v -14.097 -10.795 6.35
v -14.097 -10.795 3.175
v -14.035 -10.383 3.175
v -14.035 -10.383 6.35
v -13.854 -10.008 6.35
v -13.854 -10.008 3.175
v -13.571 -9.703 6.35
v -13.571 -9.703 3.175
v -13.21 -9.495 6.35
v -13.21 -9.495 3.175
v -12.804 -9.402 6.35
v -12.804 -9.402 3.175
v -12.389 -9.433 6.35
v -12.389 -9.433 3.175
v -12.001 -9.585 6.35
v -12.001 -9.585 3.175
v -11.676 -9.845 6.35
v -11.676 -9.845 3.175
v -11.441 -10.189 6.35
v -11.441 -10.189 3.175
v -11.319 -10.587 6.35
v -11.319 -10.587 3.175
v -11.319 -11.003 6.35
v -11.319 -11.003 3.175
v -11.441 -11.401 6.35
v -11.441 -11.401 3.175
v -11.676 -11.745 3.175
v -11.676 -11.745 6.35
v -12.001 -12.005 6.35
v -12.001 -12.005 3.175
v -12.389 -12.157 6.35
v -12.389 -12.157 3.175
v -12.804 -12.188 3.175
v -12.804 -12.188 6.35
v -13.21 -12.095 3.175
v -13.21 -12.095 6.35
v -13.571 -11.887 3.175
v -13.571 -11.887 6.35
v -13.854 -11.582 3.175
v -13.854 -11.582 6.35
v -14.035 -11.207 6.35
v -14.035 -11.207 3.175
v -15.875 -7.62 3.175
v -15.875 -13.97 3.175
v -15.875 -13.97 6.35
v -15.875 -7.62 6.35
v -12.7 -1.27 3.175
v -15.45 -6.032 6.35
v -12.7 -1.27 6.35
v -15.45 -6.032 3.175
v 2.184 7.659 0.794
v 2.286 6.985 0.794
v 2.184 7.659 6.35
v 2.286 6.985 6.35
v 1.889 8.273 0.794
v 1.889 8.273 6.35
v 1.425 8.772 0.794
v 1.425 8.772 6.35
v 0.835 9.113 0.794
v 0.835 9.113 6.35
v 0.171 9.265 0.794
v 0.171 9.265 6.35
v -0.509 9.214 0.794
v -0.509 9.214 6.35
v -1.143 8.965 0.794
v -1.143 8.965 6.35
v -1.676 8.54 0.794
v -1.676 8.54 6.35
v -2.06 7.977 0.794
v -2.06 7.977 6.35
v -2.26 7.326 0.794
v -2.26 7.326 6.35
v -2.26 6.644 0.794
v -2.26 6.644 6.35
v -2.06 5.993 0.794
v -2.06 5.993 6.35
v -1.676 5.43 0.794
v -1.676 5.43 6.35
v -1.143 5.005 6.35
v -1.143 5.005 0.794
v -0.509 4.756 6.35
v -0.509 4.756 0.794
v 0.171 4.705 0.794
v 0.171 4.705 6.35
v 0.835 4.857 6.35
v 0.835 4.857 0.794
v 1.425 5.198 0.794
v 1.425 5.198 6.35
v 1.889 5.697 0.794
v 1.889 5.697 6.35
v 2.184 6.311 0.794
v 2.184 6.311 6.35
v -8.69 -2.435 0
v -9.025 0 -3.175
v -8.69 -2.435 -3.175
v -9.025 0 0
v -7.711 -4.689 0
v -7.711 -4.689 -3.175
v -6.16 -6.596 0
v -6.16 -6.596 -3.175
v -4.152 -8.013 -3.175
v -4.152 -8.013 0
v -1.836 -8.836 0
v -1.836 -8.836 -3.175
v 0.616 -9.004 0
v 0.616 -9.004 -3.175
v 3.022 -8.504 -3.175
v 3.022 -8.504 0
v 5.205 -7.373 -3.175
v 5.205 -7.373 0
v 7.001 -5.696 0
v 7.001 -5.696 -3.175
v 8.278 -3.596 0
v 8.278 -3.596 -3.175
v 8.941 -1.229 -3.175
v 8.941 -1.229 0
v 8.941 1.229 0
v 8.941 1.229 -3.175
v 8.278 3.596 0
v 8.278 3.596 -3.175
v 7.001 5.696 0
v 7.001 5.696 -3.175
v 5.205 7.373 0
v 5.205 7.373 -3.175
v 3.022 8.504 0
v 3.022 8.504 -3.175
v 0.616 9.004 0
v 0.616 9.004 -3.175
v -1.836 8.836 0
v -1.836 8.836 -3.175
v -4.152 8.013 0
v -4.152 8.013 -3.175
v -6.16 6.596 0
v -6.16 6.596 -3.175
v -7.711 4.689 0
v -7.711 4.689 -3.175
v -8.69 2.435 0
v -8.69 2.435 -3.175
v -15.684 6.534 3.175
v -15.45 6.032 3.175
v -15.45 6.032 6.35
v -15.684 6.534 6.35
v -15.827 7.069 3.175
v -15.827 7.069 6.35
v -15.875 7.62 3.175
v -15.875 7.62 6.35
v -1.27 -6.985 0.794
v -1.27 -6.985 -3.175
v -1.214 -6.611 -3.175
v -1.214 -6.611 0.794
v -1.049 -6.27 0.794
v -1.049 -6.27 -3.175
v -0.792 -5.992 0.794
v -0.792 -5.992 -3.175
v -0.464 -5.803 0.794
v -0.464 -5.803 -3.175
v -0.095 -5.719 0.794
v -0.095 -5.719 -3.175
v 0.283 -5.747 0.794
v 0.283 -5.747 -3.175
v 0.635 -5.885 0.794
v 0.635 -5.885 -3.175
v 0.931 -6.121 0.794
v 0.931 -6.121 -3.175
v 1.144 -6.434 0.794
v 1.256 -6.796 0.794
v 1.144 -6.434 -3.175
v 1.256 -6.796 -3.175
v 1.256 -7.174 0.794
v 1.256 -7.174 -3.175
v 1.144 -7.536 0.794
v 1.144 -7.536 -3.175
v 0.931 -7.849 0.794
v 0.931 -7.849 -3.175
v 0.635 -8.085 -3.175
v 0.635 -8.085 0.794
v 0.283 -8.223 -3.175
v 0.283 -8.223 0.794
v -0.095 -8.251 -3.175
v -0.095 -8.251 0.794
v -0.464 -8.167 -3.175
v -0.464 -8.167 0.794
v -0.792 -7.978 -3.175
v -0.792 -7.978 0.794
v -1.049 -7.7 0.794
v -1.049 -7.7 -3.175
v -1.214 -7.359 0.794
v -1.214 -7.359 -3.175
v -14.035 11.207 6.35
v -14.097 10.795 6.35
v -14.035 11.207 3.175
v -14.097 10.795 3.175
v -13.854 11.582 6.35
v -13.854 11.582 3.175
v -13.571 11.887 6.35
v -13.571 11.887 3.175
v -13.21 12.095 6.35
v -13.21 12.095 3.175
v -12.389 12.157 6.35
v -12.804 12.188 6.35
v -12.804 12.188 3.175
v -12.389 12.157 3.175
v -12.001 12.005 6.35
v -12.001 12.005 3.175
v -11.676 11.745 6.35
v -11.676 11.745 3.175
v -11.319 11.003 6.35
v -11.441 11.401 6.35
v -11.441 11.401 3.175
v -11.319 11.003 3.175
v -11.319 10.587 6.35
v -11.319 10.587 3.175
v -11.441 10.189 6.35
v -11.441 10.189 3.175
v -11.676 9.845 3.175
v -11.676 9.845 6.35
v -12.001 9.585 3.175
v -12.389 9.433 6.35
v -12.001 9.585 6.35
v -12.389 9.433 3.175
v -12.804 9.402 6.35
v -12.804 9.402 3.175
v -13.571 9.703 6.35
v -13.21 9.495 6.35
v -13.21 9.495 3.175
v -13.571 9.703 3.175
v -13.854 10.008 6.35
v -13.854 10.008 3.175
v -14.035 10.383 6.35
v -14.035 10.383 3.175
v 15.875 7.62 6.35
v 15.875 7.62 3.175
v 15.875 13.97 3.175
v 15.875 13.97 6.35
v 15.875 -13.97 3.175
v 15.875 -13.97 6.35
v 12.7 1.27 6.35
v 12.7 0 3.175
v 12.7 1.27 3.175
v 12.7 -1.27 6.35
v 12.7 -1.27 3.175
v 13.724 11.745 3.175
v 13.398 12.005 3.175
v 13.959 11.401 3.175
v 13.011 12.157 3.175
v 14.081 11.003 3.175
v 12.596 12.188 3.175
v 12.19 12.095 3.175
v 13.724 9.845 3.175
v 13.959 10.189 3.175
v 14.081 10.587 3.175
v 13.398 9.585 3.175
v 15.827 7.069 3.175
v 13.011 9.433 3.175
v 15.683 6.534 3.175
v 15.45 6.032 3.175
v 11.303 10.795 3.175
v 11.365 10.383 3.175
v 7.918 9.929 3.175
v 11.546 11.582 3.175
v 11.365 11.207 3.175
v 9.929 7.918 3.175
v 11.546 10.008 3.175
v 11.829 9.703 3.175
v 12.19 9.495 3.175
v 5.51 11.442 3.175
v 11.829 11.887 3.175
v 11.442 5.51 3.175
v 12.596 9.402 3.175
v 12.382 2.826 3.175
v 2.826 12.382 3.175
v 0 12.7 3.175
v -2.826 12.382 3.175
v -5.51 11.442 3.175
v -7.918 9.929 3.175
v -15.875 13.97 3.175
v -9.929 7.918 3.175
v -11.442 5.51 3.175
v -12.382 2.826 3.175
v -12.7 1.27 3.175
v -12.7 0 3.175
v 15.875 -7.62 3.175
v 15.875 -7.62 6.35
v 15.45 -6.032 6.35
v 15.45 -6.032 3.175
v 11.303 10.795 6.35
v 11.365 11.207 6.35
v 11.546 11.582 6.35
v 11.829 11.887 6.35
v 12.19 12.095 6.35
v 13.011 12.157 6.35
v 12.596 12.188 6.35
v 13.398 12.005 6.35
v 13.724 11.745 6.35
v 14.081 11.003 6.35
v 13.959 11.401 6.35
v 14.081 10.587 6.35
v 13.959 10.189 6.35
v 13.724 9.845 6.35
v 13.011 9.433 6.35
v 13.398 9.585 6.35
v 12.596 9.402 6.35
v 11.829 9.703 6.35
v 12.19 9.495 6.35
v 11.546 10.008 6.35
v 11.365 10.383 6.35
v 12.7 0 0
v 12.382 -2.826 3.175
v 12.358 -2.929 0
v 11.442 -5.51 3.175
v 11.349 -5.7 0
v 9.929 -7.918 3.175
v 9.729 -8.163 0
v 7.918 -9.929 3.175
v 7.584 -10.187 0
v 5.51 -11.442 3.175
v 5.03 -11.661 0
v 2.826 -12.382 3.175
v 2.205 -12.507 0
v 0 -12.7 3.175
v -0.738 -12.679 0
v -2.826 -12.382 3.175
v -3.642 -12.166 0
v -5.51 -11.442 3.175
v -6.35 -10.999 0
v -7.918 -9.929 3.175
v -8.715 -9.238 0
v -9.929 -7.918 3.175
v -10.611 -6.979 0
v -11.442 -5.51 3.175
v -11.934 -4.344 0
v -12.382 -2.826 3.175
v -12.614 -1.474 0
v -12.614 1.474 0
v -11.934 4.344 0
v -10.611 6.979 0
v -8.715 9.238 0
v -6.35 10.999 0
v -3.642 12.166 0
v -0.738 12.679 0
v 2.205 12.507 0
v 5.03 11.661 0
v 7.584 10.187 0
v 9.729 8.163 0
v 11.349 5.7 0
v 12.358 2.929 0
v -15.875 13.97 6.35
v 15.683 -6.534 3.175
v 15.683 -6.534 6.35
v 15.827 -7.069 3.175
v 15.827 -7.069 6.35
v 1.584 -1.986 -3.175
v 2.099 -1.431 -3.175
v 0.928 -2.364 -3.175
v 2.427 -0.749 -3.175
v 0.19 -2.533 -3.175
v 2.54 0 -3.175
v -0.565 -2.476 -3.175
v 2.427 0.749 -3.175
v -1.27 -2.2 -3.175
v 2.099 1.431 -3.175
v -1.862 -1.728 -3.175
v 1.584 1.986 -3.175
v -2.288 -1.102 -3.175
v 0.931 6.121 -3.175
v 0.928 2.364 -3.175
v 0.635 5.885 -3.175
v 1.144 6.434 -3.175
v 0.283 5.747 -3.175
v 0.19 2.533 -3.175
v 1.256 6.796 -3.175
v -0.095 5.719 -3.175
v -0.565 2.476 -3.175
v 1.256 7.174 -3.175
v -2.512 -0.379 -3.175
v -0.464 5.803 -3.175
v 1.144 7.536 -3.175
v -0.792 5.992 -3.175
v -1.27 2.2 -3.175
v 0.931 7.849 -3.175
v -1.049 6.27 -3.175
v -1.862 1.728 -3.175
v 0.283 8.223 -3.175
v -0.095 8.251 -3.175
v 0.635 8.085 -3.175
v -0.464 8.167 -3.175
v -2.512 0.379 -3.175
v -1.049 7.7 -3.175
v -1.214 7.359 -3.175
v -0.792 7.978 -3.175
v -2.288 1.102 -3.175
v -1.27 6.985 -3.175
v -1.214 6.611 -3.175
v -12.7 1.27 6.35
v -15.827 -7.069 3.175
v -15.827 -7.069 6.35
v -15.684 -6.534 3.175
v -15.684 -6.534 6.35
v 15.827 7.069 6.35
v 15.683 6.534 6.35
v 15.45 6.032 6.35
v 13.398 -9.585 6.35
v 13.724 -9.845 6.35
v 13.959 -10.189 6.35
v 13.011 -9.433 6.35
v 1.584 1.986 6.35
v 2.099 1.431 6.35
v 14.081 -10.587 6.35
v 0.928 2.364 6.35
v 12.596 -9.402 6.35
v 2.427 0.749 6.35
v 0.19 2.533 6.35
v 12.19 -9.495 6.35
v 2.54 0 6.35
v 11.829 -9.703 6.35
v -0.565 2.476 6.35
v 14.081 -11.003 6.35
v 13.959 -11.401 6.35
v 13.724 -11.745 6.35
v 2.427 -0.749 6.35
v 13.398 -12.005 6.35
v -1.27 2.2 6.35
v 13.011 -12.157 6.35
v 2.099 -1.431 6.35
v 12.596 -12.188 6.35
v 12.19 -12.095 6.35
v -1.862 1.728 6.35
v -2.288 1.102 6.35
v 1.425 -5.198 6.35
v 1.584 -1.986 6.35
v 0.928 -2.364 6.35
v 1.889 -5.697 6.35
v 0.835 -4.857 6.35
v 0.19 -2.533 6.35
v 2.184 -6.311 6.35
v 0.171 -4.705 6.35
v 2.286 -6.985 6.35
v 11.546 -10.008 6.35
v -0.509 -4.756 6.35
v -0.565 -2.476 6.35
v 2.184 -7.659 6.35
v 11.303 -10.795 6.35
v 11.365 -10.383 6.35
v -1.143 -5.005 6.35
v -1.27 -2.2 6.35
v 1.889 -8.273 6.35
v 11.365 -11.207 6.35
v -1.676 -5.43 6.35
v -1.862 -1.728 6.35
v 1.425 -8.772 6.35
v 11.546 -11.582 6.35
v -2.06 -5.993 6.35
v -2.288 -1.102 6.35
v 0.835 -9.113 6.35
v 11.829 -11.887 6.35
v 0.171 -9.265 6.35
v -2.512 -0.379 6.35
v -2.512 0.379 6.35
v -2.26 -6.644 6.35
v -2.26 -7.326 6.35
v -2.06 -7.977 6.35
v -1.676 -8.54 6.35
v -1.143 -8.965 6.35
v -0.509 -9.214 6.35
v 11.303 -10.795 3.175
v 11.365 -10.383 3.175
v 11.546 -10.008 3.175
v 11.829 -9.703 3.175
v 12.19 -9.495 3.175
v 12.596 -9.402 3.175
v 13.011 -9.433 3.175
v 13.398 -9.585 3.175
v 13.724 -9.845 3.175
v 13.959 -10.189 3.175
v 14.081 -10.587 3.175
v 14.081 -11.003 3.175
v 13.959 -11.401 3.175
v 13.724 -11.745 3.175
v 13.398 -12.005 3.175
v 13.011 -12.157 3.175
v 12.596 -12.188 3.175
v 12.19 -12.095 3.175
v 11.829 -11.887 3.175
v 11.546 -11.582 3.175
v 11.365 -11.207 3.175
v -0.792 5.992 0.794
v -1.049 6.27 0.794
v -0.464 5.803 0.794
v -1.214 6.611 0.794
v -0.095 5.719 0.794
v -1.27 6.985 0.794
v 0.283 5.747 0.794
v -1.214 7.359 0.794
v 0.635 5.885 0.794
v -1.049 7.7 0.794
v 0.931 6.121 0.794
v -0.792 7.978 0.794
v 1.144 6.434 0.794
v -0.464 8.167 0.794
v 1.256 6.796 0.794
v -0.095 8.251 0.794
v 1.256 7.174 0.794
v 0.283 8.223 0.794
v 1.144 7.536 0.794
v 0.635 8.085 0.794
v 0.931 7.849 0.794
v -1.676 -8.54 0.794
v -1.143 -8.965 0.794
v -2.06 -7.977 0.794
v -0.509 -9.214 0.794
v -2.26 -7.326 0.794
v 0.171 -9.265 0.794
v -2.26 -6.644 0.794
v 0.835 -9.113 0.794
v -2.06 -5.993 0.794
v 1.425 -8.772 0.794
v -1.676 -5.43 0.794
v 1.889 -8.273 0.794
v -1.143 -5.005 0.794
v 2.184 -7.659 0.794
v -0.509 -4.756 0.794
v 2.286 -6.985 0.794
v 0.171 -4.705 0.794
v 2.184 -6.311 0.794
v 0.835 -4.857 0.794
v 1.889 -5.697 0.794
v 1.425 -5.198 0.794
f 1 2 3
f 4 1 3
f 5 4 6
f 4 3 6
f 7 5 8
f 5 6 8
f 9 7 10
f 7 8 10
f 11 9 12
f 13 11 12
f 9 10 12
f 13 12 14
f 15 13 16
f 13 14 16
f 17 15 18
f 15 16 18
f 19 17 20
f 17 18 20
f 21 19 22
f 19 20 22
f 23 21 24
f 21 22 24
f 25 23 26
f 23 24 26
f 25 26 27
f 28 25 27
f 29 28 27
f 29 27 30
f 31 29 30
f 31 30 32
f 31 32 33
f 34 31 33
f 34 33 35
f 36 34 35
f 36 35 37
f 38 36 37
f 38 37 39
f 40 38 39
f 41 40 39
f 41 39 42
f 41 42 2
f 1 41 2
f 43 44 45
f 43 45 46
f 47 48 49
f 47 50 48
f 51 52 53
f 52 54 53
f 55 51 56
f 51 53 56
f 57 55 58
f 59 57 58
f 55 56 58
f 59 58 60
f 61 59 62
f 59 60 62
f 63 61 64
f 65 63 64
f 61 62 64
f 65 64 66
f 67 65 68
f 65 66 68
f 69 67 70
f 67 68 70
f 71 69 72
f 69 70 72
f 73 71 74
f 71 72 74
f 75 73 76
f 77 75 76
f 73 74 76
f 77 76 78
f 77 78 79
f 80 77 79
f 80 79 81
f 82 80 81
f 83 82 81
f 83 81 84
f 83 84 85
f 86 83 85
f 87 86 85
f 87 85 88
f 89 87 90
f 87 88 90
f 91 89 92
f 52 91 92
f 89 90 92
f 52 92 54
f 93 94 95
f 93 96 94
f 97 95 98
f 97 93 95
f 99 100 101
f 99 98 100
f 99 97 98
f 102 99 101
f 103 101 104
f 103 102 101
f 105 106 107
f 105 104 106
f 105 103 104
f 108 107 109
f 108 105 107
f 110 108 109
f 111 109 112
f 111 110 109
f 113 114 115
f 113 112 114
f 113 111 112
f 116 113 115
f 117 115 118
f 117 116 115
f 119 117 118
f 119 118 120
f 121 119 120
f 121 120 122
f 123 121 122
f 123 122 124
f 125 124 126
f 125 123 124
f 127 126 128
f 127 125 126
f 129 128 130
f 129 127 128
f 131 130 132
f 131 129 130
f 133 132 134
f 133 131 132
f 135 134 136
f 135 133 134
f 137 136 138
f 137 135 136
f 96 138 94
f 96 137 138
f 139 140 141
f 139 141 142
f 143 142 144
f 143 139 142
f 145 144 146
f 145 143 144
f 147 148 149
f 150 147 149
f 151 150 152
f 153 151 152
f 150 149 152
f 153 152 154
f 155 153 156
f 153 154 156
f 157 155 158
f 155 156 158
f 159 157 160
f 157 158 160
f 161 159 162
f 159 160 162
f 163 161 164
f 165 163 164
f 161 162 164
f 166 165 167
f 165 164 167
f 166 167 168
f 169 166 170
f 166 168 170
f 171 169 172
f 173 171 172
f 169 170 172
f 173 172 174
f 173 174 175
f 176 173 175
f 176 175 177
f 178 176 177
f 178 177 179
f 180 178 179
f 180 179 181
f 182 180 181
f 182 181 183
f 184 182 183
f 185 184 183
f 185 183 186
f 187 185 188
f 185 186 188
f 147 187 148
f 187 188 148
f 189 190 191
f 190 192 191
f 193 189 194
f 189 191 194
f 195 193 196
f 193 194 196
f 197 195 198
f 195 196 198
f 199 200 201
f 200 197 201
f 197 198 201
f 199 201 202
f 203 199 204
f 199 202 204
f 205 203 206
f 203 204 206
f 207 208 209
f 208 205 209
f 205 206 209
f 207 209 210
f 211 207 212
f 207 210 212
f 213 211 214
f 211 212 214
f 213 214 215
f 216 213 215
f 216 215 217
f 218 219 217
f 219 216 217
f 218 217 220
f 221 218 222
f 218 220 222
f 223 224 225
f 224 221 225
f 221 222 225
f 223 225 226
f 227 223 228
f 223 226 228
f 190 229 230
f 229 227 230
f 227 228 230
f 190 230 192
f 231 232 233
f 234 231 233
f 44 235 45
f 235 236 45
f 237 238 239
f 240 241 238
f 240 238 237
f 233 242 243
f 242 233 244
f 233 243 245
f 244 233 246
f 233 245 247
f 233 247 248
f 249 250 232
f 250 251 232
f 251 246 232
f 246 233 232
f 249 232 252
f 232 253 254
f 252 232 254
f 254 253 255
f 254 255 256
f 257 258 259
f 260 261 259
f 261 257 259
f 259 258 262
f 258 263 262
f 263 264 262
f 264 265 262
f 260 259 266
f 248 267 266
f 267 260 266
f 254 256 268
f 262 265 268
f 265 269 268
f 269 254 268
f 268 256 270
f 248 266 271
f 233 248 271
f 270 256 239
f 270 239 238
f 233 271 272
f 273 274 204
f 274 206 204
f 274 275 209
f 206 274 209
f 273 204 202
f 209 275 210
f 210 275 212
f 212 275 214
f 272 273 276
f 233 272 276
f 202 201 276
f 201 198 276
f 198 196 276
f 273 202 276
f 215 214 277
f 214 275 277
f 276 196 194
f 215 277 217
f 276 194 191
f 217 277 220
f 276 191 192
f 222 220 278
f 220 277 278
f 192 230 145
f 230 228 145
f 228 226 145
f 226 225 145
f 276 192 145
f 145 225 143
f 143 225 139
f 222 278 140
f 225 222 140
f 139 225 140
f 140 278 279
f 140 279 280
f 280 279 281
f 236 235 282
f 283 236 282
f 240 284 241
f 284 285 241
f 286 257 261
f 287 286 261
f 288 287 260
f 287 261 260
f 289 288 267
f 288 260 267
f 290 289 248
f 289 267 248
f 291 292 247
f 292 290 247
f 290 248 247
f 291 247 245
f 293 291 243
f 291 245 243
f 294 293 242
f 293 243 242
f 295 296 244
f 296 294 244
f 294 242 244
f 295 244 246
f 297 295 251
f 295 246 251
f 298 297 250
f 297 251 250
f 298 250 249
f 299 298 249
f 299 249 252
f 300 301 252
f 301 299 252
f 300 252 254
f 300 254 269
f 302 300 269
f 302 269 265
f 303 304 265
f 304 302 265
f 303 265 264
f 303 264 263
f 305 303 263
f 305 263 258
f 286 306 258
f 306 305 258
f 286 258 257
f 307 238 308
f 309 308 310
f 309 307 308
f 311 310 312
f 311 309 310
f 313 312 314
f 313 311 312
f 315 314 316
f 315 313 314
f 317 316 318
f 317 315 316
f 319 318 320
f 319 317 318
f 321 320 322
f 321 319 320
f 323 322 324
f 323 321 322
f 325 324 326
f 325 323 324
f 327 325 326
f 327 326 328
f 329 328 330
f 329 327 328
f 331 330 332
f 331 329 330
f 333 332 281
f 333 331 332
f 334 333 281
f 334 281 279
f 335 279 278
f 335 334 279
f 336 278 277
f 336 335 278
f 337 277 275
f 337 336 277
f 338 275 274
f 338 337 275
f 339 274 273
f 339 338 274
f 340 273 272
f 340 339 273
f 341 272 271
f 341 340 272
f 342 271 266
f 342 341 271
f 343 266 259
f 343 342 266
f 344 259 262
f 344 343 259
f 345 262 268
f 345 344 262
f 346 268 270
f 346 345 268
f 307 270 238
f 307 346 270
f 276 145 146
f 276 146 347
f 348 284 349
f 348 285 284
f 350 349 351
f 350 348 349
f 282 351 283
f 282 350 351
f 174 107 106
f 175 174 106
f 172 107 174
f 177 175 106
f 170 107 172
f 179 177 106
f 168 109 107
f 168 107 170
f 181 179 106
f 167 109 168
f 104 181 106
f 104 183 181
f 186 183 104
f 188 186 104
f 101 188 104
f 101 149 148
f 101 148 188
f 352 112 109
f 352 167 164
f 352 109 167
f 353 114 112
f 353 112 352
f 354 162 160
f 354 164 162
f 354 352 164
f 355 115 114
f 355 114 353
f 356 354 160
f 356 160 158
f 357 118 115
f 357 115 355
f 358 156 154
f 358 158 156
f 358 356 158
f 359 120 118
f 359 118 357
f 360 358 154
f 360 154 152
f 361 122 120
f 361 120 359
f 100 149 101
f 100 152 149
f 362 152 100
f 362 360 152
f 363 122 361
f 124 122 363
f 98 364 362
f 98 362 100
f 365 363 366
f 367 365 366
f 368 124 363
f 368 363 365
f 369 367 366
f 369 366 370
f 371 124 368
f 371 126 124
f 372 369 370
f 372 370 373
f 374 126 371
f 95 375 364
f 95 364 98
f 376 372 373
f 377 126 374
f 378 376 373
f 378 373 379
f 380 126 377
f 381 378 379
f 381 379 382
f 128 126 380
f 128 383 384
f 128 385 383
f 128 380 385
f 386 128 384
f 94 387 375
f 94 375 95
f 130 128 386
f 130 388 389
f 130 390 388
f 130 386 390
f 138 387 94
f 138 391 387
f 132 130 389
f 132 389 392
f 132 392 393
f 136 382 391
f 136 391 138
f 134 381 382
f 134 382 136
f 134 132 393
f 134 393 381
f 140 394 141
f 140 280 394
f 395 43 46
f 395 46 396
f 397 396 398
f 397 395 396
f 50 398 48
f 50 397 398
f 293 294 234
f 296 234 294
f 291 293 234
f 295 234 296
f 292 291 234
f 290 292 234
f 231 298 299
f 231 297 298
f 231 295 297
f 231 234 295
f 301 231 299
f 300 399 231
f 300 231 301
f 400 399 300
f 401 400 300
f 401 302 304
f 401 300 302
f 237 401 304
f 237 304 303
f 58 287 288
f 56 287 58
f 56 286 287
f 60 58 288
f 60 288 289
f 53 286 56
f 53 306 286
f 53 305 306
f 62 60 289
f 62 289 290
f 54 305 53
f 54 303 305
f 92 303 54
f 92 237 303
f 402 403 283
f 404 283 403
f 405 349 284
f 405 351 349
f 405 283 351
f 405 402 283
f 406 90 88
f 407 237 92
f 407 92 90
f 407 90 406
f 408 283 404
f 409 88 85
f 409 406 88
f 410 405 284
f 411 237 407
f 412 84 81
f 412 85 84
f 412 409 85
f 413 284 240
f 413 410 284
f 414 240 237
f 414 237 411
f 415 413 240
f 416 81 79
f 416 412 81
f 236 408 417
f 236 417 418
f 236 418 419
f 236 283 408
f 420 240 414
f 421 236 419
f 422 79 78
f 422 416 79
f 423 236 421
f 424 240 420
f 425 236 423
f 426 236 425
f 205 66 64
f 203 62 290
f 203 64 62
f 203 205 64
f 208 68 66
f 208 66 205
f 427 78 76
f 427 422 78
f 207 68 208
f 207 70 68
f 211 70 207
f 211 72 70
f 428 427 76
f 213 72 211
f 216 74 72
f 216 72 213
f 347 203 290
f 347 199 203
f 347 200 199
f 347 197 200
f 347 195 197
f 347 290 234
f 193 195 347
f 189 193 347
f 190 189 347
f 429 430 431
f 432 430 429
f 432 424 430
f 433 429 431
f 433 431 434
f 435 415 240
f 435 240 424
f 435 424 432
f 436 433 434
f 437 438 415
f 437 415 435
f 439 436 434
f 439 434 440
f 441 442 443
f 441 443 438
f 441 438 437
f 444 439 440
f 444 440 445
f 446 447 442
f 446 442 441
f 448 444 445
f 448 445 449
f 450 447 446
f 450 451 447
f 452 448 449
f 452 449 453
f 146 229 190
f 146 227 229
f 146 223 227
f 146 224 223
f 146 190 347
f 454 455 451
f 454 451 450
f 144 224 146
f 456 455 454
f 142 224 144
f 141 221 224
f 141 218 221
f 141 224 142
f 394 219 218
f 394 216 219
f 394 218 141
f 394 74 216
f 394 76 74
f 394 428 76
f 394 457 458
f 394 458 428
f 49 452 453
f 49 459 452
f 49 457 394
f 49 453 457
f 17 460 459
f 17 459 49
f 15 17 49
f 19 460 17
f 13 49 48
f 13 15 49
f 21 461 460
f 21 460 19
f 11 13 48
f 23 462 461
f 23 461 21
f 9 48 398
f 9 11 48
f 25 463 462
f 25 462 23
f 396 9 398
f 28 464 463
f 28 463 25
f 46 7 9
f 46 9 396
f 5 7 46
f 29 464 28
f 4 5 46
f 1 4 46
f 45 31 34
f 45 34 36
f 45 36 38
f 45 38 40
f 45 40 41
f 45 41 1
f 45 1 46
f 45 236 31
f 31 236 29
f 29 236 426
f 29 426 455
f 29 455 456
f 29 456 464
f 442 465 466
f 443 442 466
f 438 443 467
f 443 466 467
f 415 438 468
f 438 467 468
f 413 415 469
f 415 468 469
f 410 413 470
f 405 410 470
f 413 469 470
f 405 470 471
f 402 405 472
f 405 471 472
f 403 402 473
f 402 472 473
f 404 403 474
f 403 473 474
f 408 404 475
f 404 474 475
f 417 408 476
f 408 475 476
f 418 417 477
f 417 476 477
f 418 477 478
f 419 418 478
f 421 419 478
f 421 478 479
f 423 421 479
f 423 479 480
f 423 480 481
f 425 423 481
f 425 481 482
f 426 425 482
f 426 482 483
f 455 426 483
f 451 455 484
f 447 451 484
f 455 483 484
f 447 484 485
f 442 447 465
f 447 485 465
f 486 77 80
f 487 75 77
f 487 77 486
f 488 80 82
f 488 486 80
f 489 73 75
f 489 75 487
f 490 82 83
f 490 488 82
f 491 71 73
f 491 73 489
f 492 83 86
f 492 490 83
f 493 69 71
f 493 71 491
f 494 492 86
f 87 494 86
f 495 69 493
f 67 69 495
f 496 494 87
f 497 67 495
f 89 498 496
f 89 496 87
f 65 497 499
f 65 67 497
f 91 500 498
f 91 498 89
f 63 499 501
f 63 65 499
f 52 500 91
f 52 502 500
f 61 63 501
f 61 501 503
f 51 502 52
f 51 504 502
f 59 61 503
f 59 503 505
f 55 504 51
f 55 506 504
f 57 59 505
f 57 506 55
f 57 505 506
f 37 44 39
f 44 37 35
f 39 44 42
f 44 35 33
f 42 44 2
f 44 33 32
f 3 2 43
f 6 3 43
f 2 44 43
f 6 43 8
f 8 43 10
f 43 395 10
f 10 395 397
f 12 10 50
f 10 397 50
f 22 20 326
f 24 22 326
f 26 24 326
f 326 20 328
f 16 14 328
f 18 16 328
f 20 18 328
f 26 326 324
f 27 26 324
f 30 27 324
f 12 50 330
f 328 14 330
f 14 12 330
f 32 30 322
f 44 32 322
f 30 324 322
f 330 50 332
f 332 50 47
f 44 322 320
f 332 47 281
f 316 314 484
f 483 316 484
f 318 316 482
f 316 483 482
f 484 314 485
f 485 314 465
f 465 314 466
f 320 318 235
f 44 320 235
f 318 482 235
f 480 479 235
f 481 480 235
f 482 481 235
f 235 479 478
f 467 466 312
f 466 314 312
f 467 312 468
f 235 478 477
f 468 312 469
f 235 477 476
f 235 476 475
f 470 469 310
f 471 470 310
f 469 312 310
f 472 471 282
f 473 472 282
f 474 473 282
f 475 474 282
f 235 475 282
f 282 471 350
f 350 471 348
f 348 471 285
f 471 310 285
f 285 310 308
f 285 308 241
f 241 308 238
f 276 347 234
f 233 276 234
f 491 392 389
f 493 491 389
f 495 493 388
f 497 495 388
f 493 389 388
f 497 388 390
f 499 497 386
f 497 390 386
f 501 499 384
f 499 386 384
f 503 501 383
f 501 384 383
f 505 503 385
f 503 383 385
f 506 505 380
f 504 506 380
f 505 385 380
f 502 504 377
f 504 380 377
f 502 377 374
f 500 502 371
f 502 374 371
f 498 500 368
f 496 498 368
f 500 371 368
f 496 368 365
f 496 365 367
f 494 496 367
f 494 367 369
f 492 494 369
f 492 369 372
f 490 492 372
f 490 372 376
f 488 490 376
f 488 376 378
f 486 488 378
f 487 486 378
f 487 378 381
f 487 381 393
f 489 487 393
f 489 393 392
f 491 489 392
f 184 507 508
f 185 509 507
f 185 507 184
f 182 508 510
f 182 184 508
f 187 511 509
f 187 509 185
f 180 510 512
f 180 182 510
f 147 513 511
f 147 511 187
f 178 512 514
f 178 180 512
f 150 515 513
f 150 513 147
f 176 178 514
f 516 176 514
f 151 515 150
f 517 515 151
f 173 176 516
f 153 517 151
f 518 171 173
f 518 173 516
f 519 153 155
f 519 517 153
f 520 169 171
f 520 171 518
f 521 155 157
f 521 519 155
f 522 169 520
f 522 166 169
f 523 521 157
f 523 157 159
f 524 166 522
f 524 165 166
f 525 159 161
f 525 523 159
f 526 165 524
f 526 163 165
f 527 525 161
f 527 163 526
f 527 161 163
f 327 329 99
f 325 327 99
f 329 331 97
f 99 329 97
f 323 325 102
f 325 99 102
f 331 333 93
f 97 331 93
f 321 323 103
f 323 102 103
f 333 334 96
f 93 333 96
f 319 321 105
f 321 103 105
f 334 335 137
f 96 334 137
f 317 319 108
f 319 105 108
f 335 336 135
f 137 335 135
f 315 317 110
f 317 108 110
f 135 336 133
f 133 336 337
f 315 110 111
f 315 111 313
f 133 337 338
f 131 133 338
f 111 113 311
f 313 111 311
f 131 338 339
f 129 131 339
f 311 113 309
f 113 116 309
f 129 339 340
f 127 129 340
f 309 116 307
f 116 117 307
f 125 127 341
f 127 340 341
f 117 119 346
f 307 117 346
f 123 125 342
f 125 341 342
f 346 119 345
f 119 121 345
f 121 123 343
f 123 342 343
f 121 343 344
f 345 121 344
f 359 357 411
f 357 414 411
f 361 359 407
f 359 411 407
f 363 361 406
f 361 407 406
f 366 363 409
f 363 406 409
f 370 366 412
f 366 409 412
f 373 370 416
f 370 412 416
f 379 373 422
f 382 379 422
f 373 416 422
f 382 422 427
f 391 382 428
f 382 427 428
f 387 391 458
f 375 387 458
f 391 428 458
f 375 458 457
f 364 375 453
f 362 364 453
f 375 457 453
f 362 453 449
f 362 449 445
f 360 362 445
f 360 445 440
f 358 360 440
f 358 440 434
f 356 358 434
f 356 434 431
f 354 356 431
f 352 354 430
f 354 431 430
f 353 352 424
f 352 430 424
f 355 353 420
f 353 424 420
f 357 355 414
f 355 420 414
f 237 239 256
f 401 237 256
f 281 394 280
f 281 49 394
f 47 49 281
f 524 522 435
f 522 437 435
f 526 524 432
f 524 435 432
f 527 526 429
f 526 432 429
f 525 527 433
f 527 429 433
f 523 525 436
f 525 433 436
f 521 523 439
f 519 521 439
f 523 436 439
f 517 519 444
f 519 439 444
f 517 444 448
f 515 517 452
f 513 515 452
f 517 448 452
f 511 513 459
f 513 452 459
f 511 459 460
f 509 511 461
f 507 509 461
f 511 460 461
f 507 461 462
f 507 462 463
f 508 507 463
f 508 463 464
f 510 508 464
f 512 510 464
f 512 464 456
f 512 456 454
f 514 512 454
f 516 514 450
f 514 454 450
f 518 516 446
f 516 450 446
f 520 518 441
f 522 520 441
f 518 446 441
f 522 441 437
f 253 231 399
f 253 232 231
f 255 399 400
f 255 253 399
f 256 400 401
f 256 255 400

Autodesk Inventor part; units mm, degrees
ref_plane "YZ Plane" through (0, 0, 0) normal (1, 0, 0) x (0, 1, 0)
ref_plane "Work Plane1" through (0, 0, 0) normal (0, 0, 1) x (1, 0, 0)
sketch "Sketch1" plane through (0, 0, 0) normal (0, 0, 1) x (1, 0, 0)
  circle A0 centre (0, 0) radius 9.525 projected
  circle A1 centre (0, 0) radius 12.7 projected
  point P0 (0, 0)
extrude "Extrusion1" add sketch "Sketch1" along normal blind 3.175 contours A0 | A1
sketch "Sketch2" plane through (0, 0, 0) normal (0, 0, -1) x (-1, 0, 0)
  circle A0 centre (0, 0) radius 9.025
  point P0 (0, 0)
  dimension "d2" = 18.05
extrude "Extrusion2" add sketch "Sketch2" along normal blind 3.175
sketch "Sketch3" plane through (0, 0, 3.175) normal (0, 0, 1) x (1, 0, 0)
  circle A0 centre (0, 0) radius 2.54
  point P0 (0, 0)
  dimension "d5" = 5.08
extrude "Extrusion3" cut sketch "Sketch3" against normal through all
sketch "Sketch4" plane through (0, 0, 0) normal (0, 1, 0) x (-1, 0, 0)
  line L0 (12.7, 3.175) -> (-12.7, 3.175) projected
  line L1 (-12.7, 3.175) -> (12.7, 3.175)
  line L2 (12.7, 3.175) -> (12.7, 6.35)
  line L3 (12.7, 6.35) -> (-12.7, 6.35)
  line L4 (-12.7, 6.35) -> (-12.7, 3.175)
  point P0 (0, 0)
  dimension "d8" = 3.175
ref_plane "Work Plane2" through (-27.0849, -13.97, -71.335) normal (0, 1, 0) x (0, 0, 1)
extrude "Extrusion4" add sketch "Sketch4" against normal up to surface (13.97 mm away)
sketch "Sketch5" plane through (0, 0, 3.175) normal (0, 0, 1) x (1, 0, 0)
  line L0 (-12.7, 0) -> (-2.54, 0) projected
  arc A0 (2.54, 0) -> (-2.54, 0) centre (0, 0) ccw projected
  line L1 (2.54, 0) -> (12.7, 0) projected
  arc A1 (12.7, 0) -> (-12.7, 0) centre (0, 0) ccw projected
  point P0 (0, 0)
extrude "Extrusion5" add sketch "Sketch5" along normal blind 3.175
sketch "Sketch6" plane through (0, 0, 6.35) normal (0, 0, 1) x (1, 0, 0)
  circle A0 centre (0, 0) radius 1.905
  point P0 (0, 0)
extrude "Extrusion6" cut sketch "Sketch6" against normal blind 3.175
sketch "Sketch8" plane through (0, 0, 3.175) normal (0, 0, -1) x (-1, 0, 0)
  line L0 (-29.0812, -13.97) -> (27.0849, -13.97) projected
  arc A0 (-1.905, 0) -> (1.905, 0) centre (0, 0) ccw projected
  arc A1 (12.7, 0) -> (-12.7, 0) centre (0, 0) ccw projected
  line L1 (12.7, 0) -> (12.7, -13.97) projected
  line L2 (-12.7, -13.97) -> (12.7, -13.97) projected
  line L3 (-12.7, 0) -> (-12.7, -13.97) projected
  line L4 (15.875, -13.97) -> (15.875, -7.62)
  line L5 (15.4496, -6.0325) -> (12.7, -1.27)
  line L6 (12.7, 0) -> (12.7, -13.97) projected
  arc A2 (15.875, -7.62) -> (15.4496, -6.0325) centre (12.7, -7.62) ccw
  line L7 (-15.875, -13.97) -> (-15.875, -7.62)
  line L8 (-15.4496, -6.0325) -> (-12.7, -1.27)
  line L9 (-12.7, 0) -> (-12.7, -13.97) projected
  arc A3 (-15.4496, -6.0325) -> (-15.875, -7.62) centre (-12.7, -7.62) ccw
  line L10 (2.54, 0) -> (1.905, 0) projected
  arc A4 (2.54, 0) -> (-2.54, 0) centre (0, 0) ccw projected
  line L11 (-1.905, 0) -> (-2.54, 0) projected
  point P0 (0, 0)
  dimension "d21" = 3.175
  dimension "d22" = 3.175
  dimension "d23" = 6.35
  dimension "d24" = 3.175
  dimension "d25" = 3.175
  dimension "d26" = 6.35
extrude "Extrusion8" add sketch "Sketch8" against normal blind 3.175 contours L7 A3 L8 L3 L0 | L1 L5 A2 L4 L0
sketch "Sketch9" plane through (0, 0, 3.175) normal (0, 0, -1) x (-1, 0, 0)
  circle A0 centre (12.7, -10.795) radius 1.397
  circle A1 centre (-12.7, -10.795) radius 1.397
  line L0 (15.875, -13.97) -> (15.875, -7.62) projected
  line L1 (-15.875, -13.97) -> (15.875, -13.97) projected
  line L2 (-15.875, -7.62) -> (-15.875, -13.97) projected
  point P0 (0, 0)
  dimension "d29" = 3.175
  dimension "d30" = 3.175
  dimension "d31" = 2.794
  dimension "d32" = 3.175
  dimension "d33" = 3.175
extrude "Extrusion9" cut sketch "Sketch9" against normal blind 3.175
sketch "Sketch10" plane through (0, 0, 6.35) normal (0, 0, 1) x (1, 0, 0)
  circle A0 centre (0, 0) radius 2.54
  circle A1 centre (0, 6.985) radius 2.286
  circle A2 centre (0, -6.985) radius 2.286
  circle A3 centre (0, 0) radius 9.025 projected
  dimension "d36" = 5.08
  dimension "d37" = 4.572
  dimension "d38" = 4.572
  dimension "d39" = 6.985
  dimension "d40" = 6.985
extrude "Extrusion10" cut sketch "Sketch10" against normal through all contours A0
extrude "Extrusion11" cut sketch "Sketch10" against normal blind 5.5563 contours A1 A3 | A3 A1 | A3 A2 | A2 A3
sketch "Sketch11" plane through (0, 0, -3.175) normal (0, 0, -1) x (-1, 0, 0)
  circle A0 centre (0, -6.985) radius 2.286 projected
  circle A1 centre (0, 6.985) radius 2.286 projected
  circle A2 centre (0, -6.985) radius 1.27
  circle A3 centre (0, 6.985) radius 1.27
  point P0 (0, 0)
  dimension "d45" = 2.54
extrude "Extrusion12" cut sketch "Sketch11" against normal through all contours A2 | A3
mirror "Mirror1" about plane through (0, 0, 0) normal (0, 1, 0) of "Extrusion8", "Extrusion9", "Extrusion4", "Extrusion11", "Extrusion3", "Extrusion10"
sketch "Sketch12" plane through (-15.875, -13.97, 6.35) normal (0, 0, 1) x (1, 0, 0)
  circle A0 centre (15.875, 13.97) radius 2.2303
extrude "Extrusion13" cut sketch "Sketch12" against normal blind 25.4
properties part number "Cap Top Cap"
